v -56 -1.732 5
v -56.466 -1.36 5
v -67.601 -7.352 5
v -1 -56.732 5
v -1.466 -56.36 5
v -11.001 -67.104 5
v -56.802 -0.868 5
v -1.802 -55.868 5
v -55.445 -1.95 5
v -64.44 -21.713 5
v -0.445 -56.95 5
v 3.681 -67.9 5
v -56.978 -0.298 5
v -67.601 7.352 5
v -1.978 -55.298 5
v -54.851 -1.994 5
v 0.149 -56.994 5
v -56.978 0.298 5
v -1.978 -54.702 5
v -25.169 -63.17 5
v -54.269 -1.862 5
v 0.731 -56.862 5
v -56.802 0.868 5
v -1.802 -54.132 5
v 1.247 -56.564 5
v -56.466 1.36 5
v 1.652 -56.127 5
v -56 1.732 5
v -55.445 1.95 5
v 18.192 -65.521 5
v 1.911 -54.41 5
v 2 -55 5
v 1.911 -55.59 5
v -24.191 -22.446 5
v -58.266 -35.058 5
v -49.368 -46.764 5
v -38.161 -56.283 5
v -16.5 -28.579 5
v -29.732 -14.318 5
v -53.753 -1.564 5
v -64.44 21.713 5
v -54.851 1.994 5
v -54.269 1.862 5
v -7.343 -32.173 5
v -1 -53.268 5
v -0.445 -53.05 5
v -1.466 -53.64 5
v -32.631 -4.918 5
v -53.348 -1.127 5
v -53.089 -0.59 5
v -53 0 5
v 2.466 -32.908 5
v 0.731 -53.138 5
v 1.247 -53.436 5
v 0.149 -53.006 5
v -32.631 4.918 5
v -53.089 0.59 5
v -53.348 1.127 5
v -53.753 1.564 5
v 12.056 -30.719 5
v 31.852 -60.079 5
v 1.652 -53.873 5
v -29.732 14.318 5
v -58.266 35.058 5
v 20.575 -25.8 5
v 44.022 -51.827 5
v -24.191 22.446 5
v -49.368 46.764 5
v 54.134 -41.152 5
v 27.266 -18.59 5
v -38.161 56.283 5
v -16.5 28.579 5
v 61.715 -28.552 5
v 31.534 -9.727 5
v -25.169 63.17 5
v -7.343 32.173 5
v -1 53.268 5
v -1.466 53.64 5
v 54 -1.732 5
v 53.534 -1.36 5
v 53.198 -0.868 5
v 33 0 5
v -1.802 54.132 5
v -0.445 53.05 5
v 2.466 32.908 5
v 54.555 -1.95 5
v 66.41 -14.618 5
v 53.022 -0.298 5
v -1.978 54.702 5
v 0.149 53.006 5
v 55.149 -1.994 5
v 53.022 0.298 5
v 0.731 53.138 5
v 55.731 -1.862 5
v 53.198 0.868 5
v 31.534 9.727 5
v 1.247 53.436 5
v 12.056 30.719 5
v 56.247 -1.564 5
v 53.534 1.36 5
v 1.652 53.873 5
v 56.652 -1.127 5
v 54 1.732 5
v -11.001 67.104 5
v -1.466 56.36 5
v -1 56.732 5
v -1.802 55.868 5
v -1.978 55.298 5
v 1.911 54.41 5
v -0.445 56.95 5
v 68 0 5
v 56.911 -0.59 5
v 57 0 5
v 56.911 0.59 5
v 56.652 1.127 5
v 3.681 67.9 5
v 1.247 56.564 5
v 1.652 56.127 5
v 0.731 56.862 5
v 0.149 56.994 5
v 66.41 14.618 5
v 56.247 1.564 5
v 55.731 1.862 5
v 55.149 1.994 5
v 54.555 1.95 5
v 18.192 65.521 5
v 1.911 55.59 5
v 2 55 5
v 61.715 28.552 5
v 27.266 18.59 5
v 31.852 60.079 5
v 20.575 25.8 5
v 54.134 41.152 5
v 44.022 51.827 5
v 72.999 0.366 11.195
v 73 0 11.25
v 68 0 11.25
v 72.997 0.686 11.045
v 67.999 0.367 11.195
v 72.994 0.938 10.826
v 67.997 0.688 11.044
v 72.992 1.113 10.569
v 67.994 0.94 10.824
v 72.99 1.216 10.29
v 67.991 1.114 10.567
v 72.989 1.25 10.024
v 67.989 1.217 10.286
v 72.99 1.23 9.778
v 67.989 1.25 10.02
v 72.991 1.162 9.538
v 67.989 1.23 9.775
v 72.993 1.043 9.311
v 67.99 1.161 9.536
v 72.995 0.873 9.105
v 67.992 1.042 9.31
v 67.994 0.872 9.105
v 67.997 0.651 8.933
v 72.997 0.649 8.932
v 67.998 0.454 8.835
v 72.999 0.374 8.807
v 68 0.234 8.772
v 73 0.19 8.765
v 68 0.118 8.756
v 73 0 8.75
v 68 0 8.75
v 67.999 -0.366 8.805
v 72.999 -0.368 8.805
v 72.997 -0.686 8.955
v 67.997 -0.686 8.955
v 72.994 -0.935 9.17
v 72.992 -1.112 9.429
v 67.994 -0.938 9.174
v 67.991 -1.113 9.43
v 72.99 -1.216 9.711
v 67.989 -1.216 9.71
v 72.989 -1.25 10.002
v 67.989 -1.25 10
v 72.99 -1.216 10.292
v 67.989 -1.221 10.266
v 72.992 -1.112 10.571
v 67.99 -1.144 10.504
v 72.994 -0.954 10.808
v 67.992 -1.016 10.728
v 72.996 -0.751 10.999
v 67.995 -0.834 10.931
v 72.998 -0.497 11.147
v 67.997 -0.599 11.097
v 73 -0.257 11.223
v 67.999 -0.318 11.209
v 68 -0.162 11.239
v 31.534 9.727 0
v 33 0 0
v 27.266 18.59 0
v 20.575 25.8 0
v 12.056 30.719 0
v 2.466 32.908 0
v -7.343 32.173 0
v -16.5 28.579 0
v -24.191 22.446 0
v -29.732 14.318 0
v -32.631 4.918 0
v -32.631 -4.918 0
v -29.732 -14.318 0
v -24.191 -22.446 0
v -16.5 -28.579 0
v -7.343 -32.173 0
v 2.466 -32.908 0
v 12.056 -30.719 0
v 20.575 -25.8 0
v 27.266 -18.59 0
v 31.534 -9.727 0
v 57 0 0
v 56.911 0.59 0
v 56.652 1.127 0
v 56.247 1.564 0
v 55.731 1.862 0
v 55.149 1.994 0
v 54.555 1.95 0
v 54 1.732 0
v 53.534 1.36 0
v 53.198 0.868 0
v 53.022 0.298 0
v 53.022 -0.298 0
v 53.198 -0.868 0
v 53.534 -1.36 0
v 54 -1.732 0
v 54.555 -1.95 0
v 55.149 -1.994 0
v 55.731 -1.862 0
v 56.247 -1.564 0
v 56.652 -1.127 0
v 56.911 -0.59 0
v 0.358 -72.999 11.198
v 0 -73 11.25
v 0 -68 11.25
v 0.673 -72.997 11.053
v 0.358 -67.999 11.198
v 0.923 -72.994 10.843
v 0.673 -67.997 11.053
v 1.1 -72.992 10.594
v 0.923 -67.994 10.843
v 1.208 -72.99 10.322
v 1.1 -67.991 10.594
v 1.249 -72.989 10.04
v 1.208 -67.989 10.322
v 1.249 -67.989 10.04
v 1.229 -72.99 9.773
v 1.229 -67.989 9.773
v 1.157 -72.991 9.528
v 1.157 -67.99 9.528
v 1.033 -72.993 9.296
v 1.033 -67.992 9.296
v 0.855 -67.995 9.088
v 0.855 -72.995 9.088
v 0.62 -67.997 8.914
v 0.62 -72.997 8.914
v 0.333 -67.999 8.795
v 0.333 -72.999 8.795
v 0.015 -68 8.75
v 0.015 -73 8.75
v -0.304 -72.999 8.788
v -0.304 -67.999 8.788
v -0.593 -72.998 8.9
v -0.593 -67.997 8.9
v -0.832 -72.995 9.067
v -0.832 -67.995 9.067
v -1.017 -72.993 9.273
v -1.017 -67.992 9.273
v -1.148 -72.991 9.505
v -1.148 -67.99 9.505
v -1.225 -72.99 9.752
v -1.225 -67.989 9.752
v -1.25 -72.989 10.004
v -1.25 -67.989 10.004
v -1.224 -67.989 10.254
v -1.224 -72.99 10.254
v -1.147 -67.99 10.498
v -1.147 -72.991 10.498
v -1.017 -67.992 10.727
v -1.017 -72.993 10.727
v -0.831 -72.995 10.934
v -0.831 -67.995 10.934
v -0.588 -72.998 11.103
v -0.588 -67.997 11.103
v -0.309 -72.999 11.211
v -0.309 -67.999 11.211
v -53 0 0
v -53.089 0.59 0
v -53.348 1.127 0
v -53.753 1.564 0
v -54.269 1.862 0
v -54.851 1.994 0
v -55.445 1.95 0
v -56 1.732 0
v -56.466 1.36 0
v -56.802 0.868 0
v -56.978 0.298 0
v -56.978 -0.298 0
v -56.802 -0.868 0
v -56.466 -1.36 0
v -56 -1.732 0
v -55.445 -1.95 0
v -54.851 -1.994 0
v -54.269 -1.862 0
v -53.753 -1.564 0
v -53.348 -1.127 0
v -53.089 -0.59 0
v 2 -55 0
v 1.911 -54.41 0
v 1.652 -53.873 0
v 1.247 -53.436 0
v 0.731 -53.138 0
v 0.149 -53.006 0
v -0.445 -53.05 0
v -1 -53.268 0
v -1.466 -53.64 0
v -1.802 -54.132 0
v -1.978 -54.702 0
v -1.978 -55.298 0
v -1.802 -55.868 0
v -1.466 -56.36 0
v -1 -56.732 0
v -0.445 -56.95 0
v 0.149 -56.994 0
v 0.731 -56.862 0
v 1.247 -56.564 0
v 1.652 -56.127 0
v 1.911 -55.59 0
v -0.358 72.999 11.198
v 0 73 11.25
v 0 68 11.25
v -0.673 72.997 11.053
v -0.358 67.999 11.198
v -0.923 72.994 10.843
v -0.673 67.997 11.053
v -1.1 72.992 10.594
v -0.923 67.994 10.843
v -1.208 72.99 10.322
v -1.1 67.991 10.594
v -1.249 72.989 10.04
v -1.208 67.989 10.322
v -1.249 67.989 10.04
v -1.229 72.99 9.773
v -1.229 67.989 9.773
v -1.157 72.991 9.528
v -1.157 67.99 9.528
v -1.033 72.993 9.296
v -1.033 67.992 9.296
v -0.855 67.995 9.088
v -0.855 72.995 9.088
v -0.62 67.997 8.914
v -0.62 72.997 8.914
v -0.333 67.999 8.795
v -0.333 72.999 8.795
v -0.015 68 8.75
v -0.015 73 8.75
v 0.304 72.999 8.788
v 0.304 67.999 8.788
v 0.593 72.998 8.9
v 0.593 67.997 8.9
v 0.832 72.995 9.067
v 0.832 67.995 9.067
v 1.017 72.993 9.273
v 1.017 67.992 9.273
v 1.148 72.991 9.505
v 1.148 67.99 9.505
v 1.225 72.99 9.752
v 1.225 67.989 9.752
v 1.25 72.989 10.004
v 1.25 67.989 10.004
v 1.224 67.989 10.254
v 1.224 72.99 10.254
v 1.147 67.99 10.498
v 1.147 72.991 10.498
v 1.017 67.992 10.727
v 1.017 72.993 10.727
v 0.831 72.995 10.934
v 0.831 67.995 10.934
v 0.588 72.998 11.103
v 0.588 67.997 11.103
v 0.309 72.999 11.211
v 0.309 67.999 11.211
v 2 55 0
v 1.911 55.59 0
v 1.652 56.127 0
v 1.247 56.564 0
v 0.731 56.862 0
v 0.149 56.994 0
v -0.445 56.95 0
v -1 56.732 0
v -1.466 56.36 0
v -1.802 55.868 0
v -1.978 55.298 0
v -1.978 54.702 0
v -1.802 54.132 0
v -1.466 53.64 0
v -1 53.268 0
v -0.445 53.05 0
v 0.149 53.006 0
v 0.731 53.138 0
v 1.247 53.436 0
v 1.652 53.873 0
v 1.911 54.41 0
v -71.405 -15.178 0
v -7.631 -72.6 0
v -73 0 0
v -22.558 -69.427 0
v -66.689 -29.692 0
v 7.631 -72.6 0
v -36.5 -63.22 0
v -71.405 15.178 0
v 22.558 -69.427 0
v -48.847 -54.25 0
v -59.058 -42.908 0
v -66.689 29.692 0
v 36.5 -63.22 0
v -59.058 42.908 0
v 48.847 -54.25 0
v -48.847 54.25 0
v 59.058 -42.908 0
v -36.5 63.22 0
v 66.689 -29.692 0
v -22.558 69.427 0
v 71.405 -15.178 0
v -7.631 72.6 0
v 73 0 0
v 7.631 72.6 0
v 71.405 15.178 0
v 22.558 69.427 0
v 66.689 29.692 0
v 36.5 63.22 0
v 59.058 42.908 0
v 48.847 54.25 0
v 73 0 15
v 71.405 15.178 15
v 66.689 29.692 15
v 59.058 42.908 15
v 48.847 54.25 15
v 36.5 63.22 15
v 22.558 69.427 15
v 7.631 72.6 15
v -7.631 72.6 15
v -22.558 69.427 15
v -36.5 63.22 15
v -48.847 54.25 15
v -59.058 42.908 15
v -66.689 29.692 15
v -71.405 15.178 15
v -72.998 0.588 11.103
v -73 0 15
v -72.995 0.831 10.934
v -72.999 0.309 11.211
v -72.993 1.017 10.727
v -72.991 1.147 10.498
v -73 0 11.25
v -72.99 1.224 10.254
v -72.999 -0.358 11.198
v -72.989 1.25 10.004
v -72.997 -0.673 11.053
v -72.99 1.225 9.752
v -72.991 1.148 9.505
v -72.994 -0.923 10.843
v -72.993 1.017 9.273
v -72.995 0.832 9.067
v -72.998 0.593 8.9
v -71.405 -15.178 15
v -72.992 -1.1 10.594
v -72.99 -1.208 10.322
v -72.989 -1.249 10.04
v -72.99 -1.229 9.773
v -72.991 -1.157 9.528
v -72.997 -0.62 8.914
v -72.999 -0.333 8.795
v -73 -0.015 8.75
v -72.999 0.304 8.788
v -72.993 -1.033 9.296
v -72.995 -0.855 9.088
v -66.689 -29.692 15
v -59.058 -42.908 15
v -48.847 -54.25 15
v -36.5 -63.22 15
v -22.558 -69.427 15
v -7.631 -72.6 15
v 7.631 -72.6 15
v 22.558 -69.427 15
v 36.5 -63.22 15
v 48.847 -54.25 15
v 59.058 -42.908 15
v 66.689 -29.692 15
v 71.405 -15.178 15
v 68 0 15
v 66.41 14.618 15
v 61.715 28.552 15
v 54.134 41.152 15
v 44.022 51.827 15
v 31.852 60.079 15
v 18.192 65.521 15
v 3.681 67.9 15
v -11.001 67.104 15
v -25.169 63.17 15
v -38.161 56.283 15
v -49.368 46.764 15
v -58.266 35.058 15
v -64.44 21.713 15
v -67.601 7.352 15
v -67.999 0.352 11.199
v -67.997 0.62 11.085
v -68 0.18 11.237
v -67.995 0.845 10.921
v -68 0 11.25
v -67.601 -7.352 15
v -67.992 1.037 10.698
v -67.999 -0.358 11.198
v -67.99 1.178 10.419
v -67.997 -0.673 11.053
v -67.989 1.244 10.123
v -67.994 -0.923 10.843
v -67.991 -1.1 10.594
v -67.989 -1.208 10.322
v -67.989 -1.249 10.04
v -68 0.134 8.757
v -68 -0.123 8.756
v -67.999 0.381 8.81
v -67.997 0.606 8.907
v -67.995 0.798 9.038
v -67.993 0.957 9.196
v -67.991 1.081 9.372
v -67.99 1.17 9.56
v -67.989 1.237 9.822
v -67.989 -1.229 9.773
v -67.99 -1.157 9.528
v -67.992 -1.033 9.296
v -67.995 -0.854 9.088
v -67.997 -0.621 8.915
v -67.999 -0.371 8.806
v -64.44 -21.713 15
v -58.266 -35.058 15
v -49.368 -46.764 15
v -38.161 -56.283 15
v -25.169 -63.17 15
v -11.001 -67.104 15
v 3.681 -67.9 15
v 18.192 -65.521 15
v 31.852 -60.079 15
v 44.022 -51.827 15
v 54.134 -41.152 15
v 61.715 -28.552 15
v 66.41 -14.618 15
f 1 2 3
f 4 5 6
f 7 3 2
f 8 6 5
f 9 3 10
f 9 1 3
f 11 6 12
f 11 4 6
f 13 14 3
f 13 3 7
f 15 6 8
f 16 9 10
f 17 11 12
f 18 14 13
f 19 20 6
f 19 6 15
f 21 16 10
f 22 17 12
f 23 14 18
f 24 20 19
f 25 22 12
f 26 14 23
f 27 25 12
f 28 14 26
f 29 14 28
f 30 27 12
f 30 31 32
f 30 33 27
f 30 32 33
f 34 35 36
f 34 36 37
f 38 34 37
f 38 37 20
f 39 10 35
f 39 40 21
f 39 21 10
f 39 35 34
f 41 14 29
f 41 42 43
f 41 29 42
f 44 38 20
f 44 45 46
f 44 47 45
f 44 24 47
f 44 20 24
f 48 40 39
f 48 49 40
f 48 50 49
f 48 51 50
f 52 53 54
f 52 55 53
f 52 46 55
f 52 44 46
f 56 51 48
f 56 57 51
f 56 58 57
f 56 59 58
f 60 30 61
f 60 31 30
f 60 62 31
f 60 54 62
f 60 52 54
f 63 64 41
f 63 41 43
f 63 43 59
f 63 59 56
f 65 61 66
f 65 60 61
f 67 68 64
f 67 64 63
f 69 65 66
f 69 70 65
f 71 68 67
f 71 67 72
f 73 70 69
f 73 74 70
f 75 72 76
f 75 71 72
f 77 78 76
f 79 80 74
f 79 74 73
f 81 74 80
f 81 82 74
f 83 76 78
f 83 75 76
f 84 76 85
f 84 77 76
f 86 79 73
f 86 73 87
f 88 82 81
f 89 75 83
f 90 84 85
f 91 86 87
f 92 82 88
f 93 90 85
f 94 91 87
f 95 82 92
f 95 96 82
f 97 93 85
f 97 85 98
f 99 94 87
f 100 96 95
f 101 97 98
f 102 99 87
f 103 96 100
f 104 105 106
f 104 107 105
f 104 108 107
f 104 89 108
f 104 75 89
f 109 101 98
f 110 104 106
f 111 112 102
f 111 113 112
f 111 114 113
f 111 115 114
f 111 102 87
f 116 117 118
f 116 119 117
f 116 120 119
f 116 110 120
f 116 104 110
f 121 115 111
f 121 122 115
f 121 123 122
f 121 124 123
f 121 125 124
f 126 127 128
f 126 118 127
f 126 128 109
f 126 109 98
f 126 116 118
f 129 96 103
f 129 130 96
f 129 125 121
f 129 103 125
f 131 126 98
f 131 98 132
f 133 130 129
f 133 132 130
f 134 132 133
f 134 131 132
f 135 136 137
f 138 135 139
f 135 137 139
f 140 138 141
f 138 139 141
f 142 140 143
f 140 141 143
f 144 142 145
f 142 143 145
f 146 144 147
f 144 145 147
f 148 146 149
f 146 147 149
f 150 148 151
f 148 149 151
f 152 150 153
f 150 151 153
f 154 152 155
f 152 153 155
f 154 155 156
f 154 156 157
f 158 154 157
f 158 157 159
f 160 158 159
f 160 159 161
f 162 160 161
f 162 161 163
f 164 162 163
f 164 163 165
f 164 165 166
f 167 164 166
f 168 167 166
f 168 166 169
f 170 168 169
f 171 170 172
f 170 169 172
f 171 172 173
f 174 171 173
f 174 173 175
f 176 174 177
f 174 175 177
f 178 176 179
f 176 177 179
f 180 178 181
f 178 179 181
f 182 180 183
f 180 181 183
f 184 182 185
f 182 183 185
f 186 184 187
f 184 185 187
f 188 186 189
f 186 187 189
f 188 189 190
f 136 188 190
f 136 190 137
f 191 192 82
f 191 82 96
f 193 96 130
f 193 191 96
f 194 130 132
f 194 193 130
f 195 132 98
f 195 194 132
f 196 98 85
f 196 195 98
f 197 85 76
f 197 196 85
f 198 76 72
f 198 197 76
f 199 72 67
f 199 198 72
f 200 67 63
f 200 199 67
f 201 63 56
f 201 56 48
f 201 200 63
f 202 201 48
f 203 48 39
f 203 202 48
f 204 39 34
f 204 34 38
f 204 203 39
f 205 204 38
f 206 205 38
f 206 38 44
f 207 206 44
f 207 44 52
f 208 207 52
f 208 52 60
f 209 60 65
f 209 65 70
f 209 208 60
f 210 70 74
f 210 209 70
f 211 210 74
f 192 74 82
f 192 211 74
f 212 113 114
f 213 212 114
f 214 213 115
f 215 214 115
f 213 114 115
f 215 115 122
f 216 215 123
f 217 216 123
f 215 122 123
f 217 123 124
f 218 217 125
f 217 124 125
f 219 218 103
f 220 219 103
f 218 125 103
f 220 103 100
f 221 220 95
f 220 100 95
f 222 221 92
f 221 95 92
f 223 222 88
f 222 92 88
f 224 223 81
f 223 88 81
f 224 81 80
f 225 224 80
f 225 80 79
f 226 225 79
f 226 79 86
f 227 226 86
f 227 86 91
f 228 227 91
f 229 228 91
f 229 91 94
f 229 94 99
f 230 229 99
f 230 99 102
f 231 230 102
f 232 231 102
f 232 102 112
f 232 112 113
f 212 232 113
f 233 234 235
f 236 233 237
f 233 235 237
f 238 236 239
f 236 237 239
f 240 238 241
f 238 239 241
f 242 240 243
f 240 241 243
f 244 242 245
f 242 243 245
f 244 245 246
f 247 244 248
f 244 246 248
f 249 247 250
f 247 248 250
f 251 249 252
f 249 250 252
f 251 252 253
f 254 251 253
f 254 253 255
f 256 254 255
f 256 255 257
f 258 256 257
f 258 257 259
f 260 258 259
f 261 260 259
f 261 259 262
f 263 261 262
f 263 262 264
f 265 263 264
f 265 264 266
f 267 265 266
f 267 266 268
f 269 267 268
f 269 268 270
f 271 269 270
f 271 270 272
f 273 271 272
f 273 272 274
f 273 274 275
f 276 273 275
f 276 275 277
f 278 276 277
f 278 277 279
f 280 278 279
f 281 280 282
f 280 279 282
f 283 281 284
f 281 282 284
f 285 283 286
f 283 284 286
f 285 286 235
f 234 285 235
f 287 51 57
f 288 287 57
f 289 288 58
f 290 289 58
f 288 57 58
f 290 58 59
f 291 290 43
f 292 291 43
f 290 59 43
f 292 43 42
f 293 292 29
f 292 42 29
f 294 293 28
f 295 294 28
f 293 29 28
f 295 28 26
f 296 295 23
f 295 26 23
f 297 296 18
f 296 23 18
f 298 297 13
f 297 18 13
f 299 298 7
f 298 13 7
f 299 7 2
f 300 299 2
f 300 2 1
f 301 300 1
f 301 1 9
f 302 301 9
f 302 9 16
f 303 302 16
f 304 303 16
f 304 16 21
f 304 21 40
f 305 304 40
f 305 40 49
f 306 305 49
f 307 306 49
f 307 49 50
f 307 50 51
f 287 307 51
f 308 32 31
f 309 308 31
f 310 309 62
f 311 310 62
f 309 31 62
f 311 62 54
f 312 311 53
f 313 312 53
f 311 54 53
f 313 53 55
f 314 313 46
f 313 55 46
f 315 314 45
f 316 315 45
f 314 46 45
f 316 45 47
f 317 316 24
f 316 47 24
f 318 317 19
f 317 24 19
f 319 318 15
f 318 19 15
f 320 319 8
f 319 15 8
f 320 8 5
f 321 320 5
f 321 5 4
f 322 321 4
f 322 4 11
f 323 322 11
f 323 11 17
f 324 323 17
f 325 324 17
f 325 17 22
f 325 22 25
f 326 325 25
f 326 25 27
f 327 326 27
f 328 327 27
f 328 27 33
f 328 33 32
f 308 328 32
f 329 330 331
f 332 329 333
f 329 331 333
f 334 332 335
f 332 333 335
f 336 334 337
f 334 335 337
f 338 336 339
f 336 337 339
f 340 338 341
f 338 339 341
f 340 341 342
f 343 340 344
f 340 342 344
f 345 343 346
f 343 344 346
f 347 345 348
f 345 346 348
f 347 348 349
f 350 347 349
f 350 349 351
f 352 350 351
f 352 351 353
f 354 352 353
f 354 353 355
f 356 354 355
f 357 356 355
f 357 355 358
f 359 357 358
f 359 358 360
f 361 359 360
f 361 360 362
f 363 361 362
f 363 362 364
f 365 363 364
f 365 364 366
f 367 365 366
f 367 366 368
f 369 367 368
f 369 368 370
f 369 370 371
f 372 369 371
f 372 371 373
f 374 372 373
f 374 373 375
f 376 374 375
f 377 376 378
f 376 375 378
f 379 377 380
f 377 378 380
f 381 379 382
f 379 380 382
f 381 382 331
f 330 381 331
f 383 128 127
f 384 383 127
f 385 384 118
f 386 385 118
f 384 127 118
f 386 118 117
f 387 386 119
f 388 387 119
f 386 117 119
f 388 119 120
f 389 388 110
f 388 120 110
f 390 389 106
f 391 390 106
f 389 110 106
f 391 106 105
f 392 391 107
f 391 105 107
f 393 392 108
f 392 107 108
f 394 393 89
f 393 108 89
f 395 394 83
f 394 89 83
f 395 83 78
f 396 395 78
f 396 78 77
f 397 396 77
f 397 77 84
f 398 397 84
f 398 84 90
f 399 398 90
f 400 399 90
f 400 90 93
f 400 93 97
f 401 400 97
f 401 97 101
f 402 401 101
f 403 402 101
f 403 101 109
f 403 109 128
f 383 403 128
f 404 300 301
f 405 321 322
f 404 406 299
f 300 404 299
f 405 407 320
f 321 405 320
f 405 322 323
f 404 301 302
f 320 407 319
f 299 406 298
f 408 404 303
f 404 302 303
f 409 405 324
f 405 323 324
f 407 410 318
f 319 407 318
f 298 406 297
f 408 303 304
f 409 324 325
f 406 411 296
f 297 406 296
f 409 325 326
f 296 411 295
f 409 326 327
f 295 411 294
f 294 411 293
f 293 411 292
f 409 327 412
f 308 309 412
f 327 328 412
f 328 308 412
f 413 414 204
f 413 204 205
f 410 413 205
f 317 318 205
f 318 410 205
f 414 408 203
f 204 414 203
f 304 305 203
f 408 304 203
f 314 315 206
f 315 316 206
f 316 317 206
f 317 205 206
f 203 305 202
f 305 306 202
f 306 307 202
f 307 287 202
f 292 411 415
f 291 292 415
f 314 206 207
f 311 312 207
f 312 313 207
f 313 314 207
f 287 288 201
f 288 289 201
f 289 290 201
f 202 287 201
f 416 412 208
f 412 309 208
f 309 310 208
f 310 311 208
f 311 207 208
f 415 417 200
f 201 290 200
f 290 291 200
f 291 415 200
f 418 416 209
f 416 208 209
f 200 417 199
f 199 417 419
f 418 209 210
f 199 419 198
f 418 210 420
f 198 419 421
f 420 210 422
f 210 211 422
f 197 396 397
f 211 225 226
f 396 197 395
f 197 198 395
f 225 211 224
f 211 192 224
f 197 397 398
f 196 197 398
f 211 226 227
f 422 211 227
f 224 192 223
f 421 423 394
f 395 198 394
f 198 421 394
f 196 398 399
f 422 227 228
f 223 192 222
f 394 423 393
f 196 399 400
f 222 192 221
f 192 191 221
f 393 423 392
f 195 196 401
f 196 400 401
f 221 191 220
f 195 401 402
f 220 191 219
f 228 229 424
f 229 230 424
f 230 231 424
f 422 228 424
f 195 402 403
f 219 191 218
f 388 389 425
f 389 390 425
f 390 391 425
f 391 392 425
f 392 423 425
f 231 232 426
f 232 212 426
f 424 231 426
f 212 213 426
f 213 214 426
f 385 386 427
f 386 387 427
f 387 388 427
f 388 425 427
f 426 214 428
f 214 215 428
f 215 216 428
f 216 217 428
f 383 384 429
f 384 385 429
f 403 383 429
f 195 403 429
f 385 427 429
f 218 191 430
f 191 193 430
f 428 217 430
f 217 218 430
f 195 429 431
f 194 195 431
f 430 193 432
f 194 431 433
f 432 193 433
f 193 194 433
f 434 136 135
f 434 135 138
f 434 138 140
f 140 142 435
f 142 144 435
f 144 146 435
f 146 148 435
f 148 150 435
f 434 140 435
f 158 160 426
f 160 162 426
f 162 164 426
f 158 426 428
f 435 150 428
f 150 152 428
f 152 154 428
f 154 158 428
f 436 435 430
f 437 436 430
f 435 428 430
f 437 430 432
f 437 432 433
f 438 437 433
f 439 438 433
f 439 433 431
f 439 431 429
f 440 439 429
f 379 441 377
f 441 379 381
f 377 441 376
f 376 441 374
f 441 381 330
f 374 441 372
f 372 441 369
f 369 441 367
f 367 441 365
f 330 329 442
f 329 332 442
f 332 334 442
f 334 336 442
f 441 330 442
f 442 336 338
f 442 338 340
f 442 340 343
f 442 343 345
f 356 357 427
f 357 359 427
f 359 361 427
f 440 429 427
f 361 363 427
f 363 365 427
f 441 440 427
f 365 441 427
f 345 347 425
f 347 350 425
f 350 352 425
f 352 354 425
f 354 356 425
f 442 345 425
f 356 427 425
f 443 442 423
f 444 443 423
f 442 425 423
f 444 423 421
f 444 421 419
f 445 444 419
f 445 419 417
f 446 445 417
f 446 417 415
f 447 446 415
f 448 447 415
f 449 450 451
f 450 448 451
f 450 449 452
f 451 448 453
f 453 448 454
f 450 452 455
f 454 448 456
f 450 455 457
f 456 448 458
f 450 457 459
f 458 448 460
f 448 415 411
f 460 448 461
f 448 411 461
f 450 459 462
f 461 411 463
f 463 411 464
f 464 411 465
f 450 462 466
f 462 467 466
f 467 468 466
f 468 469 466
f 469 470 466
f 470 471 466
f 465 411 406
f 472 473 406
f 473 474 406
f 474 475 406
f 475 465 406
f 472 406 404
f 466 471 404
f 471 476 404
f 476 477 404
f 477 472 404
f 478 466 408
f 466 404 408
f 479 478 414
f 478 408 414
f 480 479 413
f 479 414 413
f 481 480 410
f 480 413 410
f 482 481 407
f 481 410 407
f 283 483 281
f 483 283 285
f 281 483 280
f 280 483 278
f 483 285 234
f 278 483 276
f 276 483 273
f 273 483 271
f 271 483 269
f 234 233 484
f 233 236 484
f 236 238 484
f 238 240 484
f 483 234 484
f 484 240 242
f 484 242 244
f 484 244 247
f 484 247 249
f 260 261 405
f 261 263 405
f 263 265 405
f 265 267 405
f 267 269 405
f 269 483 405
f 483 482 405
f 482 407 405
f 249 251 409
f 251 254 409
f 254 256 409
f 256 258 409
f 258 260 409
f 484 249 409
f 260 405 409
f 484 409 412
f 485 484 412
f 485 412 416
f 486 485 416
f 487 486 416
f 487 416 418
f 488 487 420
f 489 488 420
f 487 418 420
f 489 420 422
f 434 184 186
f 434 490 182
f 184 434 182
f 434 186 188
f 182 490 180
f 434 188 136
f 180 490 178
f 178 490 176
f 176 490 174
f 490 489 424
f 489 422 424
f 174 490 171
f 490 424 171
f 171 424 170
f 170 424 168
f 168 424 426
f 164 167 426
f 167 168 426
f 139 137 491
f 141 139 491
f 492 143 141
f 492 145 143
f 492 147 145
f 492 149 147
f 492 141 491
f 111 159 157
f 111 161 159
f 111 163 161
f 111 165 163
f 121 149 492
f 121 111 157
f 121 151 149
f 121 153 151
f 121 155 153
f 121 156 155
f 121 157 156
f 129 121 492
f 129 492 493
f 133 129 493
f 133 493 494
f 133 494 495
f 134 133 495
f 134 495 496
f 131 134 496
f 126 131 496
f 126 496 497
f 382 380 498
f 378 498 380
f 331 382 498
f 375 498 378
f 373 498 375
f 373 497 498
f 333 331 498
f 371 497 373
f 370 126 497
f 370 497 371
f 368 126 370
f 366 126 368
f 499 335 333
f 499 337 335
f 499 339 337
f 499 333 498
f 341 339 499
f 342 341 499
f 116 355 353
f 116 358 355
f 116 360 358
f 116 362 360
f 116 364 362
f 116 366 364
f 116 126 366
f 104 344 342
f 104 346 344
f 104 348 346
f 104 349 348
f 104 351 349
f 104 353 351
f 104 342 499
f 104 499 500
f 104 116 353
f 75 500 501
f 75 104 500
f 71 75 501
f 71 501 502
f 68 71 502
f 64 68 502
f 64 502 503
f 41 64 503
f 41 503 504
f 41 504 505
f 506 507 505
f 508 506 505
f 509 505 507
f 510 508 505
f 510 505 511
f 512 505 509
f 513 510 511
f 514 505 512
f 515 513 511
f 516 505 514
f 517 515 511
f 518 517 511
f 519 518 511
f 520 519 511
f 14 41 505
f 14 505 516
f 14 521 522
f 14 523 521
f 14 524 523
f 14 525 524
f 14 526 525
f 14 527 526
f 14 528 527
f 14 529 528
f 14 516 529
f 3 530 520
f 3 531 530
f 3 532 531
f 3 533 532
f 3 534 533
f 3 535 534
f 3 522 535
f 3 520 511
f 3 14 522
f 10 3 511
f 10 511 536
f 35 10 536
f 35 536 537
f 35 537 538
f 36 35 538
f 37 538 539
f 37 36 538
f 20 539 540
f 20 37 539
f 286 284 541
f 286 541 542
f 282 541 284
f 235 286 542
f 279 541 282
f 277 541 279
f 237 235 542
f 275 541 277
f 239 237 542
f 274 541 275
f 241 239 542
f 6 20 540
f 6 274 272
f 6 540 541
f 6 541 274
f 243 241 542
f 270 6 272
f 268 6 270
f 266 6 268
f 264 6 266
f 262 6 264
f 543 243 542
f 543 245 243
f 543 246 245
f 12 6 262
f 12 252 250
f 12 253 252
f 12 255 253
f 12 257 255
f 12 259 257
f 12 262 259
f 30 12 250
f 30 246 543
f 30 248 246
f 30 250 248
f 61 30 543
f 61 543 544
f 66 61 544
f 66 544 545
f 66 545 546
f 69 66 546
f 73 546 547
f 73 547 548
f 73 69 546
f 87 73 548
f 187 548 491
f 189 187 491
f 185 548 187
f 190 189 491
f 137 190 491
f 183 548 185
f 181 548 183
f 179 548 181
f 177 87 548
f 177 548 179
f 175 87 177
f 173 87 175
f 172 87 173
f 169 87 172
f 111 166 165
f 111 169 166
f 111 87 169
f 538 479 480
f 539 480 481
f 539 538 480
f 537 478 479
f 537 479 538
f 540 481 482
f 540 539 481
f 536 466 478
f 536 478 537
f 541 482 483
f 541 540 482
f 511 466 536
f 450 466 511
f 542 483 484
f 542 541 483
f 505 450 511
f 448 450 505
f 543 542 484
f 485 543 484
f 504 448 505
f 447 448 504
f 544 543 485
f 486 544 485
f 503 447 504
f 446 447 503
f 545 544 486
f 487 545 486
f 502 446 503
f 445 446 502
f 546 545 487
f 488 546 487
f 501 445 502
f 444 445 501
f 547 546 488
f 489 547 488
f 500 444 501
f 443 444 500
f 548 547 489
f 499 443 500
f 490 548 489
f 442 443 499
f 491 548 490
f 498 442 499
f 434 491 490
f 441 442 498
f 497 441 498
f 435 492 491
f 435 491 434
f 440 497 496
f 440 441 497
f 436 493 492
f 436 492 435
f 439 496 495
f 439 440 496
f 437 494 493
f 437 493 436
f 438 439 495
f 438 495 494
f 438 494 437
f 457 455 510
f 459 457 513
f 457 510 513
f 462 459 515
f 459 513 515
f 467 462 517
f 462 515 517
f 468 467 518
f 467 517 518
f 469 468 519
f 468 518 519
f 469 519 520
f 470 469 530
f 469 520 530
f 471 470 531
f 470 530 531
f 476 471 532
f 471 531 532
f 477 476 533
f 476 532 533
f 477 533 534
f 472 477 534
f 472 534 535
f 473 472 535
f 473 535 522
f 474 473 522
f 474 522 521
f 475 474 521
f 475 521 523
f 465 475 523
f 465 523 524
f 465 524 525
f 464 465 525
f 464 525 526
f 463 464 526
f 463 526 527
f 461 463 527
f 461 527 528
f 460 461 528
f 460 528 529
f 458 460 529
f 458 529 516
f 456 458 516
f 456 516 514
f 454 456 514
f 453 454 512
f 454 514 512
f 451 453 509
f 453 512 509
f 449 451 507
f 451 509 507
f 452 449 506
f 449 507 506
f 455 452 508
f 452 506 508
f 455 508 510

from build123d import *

# Parameters (mm, degrees)
SKETCH1_R               = 73
SKETCH1_R_2             = 33
BOSS_EXTRUDE1_DEPTH     = 5
SKETCH2_R               = 73
SKETCH2_R_2             = 68
BOSS_EXTRUDE2_DEPTH     = 10
CUT_EXTRUDE1_REACH      = 106.322
CUT_EXTRUDE1_END_RADIUS = 73
SKETCH3_R               = 1.25
CIRPATTERN1_COUNT       = 4
F_4_0MM_DOWEL_HOLE1_D   = 4


with BuildPart() as part:
    # Sketch1 → Boss-Extrude1 (new body)
    with BuildSketch(Plane.XY):
        Circle(SKETCH1_R)
        Circle(SKETCH1_R_2, mode=Mode.SUBTRACT)
    extrude(amount=BOSS_EXTRUDE1_DEPTH)

    # Sketch2 → Boss-Extrude2 (add)
    with BuildSketch(Plane.XY.offset(5)):
        Circle(SKETCH2_R)
        Circle(SKETCH2_R_2, mode=Mode.SUBTRACT)
    extrude(amount=BOSS_EXTRUDE2_DEPTH)

    # Cut-Extrude1: up to this cylinder (the profile starts inside it)
    cut_extrude1_end = Plane(origin=(0, 0, 10), z_dir=(0, 0, -1)) * Cylinder(CUT_EXTRUDE1_END_RADIUS, 359.644, mode=Mode.PRIVATE)
    # Sketch3 → Cut-Extrude1 (cut, up to the surface)
    with BuildSketch(Plane(origin=(0, 0, 0), x_dir=(1, 0, 0), z_dir=(0, 1, 0)), mode=Mode.PRIVATE) as cut_extrude1_sk1:
        with Locations(Location((0, -10, 0), (0, 0, 270))):
            Circle(SKETCH3_R)
    cut_extrude1_tool1 = extrude(cut_extrude1_sk1.sketch, amount=-CUT_EXTRUDE1_REACH, mode=Mode.PRIVATE) & cut_extrude1_end
    cut_extrude1 = cut_extrude1_tool1.solids().sort_by_distance((0, 0, 10))[0]
    add(cut_extrude1, mode=Mode.SUBTRACT)

    # CirPattern1: Cut-Extrude1 ×4 about axis
    cirpattern1_axis = Axis((0, 0, 5), (0, 0, -1))
    for i in range(1, CIRPATTERN1_COUNT):
        add(cut_extrude1.rotate(cirpattern1_axis, i * 360 / CIRPATTERN1_COUNT), mode=Mode.SUBTRACT)

    # Ø4.0mm Dowel Hole1 (through all)
    with Locations(Plane(origin=(0, 0, 0), x_dir=(-1, 0, 0), z_dir=(0, 0, -1))):
        with Locations((0, 55), (55, 0), (0, -55), (-55, 0)):
            Hole(F_4_0MM_DOWEL_HOLE1_D / 2)


solid = part.part
